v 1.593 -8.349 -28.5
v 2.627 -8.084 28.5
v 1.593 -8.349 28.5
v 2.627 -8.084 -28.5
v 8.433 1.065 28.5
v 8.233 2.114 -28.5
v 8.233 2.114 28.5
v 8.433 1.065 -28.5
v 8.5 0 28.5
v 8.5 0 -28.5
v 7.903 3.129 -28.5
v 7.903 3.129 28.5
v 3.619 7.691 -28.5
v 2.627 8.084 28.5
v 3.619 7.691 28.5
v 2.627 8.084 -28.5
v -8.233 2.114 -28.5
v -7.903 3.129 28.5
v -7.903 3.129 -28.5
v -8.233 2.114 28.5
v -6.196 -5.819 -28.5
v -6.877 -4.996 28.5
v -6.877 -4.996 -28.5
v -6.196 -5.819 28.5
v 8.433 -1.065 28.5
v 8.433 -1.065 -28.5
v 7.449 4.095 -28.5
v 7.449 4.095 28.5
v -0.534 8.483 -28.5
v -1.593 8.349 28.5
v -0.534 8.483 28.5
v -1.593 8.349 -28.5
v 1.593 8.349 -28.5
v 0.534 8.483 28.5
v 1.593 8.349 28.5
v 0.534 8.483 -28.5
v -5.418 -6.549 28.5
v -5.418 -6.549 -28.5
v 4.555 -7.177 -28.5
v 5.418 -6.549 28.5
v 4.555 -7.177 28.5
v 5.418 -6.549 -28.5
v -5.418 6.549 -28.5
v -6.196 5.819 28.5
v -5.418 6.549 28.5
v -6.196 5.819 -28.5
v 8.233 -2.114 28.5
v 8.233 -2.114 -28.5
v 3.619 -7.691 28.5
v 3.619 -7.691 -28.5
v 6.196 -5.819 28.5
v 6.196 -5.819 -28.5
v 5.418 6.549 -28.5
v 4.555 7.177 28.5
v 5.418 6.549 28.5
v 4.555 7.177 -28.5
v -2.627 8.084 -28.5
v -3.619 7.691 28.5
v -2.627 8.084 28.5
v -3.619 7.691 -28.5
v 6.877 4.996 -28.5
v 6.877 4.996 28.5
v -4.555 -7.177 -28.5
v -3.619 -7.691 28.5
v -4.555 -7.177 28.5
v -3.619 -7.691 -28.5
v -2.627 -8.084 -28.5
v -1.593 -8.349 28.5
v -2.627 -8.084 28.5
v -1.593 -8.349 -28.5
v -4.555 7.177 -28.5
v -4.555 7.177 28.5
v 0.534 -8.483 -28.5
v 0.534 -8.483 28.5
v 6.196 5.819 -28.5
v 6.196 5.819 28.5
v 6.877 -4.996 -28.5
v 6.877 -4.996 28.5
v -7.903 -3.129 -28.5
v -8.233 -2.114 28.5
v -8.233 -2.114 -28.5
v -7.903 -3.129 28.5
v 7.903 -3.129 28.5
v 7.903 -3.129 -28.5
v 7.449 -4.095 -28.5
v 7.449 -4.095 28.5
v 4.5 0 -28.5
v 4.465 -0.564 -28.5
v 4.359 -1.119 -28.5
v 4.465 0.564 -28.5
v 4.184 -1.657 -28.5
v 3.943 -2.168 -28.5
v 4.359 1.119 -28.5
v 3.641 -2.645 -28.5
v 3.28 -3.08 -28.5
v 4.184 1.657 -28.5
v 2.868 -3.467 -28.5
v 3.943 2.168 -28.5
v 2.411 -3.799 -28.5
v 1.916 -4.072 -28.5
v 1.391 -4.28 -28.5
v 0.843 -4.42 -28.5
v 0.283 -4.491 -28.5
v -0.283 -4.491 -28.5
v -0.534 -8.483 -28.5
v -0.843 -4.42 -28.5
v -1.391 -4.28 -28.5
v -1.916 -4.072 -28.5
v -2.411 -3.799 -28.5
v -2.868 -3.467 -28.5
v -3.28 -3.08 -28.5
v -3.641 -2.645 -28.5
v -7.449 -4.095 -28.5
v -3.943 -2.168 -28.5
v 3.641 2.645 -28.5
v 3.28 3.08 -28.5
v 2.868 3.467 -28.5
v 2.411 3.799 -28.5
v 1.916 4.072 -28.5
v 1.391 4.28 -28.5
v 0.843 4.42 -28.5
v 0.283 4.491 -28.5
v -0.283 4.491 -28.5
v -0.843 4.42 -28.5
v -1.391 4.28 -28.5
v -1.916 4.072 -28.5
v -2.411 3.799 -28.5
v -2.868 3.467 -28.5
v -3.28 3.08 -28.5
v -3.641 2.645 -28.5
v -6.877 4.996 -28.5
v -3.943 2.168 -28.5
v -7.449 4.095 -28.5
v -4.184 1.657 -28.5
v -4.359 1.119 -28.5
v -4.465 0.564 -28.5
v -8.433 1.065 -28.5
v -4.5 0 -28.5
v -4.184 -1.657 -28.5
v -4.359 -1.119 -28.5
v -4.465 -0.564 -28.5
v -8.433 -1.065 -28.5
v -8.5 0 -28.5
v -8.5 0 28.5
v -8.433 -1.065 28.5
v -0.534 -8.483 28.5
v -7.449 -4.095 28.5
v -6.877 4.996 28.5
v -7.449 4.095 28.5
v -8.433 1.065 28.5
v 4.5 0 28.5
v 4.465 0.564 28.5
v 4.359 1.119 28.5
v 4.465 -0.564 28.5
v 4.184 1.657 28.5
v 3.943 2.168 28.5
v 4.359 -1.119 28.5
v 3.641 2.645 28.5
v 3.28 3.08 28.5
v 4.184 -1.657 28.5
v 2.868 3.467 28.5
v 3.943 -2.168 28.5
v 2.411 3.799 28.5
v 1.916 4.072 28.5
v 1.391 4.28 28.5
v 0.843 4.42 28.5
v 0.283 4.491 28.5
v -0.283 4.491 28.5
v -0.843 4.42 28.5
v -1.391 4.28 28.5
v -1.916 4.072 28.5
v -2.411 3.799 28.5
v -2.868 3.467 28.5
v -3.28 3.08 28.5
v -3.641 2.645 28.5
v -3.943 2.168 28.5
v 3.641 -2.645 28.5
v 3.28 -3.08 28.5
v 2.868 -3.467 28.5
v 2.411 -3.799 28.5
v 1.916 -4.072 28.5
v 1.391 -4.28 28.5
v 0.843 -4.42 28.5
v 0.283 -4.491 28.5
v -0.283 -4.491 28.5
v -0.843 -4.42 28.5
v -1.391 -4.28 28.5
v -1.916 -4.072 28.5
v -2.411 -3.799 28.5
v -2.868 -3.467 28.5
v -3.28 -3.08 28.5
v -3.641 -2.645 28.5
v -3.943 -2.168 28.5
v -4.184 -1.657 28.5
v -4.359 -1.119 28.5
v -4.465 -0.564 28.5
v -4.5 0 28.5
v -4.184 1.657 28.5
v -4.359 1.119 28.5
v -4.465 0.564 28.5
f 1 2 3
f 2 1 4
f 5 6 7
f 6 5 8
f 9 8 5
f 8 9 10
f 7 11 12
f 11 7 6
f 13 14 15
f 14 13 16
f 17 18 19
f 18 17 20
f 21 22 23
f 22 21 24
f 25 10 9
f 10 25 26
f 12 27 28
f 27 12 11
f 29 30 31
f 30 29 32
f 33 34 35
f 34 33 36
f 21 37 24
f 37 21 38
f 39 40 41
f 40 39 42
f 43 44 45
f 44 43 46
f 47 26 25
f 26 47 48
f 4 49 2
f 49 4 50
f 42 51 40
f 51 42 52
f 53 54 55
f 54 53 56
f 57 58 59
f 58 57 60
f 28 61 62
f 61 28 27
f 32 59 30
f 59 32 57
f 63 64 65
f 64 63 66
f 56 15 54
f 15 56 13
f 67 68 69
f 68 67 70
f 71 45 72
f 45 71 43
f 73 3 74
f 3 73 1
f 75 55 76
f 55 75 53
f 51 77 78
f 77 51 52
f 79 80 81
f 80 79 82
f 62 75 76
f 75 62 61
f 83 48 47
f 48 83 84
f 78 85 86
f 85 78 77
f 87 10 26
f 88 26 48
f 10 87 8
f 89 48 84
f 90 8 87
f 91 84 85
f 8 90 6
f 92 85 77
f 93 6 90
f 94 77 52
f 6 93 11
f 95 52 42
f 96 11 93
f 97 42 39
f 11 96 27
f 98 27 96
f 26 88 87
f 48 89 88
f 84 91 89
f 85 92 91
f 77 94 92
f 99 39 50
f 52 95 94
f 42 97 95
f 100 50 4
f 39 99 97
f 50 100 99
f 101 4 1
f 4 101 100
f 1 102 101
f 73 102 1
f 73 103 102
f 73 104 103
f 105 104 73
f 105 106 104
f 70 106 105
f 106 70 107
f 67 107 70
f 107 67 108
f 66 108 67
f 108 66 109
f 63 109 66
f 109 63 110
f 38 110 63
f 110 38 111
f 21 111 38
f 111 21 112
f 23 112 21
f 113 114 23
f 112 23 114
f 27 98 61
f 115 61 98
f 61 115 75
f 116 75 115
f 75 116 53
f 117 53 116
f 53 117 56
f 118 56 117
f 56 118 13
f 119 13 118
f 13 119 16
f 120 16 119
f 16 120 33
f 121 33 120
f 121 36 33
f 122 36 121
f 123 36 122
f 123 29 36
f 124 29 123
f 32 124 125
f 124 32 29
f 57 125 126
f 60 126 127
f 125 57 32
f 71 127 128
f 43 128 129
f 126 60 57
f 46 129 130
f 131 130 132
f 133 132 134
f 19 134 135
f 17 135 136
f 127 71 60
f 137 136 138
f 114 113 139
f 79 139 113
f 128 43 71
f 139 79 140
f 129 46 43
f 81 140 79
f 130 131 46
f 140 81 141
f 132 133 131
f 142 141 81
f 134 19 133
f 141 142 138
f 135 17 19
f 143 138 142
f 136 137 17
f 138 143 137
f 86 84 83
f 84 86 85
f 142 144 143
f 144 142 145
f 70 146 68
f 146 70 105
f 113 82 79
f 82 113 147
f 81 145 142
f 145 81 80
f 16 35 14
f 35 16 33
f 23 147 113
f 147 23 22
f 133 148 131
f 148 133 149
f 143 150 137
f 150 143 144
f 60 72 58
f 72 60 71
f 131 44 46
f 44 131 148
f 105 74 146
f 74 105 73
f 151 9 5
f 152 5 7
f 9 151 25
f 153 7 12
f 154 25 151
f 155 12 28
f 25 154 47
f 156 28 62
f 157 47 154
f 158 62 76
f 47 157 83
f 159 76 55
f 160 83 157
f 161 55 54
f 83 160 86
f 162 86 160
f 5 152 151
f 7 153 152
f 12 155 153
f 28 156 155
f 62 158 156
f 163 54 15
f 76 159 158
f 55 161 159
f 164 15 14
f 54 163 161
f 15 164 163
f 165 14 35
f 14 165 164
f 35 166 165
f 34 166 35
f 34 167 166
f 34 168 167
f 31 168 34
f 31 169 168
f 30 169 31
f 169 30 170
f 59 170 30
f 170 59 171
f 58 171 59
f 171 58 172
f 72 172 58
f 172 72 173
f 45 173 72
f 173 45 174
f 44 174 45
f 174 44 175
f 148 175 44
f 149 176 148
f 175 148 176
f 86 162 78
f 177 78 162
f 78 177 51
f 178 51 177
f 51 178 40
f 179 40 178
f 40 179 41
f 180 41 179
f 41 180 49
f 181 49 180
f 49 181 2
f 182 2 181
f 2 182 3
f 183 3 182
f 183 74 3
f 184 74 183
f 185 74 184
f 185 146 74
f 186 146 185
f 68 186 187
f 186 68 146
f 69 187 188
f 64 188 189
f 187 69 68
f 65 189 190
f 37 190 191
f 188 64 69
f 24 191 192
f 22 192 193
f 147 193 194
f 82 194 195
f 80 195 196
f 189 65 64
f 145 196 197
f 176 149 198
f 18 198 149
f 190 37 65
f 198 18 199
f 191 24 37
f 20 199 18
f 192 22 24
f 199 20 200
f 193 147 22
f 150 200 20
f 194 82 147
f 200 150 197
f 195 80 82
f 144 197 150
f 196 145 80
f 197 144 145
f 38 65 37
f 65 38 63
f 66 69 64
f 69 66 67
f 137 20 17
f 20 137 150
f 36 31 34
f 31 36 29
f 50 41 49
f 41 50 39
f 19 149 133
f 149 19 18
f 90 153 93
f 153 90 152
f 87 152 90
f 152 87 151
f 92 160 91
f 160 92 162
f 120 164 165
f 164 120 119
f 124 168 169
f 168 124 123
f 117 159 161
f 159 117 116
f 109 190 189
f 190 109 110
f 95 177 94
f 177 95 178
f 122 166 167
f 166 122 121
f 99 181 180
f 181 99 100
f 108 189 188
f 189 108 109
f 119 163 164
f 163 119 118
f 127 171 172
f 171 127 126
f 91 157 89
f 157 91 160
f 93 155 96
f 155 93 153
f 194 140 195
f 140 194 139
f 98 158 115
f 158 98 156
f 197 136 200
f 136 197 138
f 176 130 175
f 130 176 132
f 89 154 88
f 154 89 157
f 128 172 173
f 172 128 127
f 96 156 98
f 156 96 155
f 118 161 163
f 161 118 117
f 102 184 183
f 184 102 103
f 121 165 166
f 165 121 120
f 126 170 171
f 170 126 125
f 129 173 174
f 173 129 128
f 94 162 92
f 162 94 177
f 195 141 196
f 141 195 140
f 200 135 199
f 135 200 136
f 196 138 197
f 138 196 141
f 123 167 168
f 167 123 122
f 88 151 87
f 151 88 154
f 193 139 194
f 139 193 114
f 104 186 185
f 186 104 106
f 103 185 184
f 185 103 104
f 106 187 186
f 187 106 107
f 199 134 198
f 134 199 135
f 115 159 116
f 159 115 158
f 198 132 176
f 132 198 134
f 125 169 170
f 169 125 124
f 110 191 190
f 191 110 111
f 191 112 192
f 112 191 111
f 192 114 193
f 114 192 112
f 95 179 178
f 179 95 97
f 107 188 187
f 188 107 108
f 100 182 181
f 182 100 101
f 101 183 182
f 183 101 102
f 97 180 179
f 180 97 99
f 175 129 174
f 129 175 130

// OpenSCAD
$fn = 50;


difference() {
	union() {
		translate(v = [0, 0, -28.5000000000]) {
			cylinder(h = 57, r = 8.5000000000);
		}
	}
	union() {
		translate(v = [0, 0, -100.0000000000]) {
			cylinder(h = 200, r = 4.5000000000);
		}
	}
}
